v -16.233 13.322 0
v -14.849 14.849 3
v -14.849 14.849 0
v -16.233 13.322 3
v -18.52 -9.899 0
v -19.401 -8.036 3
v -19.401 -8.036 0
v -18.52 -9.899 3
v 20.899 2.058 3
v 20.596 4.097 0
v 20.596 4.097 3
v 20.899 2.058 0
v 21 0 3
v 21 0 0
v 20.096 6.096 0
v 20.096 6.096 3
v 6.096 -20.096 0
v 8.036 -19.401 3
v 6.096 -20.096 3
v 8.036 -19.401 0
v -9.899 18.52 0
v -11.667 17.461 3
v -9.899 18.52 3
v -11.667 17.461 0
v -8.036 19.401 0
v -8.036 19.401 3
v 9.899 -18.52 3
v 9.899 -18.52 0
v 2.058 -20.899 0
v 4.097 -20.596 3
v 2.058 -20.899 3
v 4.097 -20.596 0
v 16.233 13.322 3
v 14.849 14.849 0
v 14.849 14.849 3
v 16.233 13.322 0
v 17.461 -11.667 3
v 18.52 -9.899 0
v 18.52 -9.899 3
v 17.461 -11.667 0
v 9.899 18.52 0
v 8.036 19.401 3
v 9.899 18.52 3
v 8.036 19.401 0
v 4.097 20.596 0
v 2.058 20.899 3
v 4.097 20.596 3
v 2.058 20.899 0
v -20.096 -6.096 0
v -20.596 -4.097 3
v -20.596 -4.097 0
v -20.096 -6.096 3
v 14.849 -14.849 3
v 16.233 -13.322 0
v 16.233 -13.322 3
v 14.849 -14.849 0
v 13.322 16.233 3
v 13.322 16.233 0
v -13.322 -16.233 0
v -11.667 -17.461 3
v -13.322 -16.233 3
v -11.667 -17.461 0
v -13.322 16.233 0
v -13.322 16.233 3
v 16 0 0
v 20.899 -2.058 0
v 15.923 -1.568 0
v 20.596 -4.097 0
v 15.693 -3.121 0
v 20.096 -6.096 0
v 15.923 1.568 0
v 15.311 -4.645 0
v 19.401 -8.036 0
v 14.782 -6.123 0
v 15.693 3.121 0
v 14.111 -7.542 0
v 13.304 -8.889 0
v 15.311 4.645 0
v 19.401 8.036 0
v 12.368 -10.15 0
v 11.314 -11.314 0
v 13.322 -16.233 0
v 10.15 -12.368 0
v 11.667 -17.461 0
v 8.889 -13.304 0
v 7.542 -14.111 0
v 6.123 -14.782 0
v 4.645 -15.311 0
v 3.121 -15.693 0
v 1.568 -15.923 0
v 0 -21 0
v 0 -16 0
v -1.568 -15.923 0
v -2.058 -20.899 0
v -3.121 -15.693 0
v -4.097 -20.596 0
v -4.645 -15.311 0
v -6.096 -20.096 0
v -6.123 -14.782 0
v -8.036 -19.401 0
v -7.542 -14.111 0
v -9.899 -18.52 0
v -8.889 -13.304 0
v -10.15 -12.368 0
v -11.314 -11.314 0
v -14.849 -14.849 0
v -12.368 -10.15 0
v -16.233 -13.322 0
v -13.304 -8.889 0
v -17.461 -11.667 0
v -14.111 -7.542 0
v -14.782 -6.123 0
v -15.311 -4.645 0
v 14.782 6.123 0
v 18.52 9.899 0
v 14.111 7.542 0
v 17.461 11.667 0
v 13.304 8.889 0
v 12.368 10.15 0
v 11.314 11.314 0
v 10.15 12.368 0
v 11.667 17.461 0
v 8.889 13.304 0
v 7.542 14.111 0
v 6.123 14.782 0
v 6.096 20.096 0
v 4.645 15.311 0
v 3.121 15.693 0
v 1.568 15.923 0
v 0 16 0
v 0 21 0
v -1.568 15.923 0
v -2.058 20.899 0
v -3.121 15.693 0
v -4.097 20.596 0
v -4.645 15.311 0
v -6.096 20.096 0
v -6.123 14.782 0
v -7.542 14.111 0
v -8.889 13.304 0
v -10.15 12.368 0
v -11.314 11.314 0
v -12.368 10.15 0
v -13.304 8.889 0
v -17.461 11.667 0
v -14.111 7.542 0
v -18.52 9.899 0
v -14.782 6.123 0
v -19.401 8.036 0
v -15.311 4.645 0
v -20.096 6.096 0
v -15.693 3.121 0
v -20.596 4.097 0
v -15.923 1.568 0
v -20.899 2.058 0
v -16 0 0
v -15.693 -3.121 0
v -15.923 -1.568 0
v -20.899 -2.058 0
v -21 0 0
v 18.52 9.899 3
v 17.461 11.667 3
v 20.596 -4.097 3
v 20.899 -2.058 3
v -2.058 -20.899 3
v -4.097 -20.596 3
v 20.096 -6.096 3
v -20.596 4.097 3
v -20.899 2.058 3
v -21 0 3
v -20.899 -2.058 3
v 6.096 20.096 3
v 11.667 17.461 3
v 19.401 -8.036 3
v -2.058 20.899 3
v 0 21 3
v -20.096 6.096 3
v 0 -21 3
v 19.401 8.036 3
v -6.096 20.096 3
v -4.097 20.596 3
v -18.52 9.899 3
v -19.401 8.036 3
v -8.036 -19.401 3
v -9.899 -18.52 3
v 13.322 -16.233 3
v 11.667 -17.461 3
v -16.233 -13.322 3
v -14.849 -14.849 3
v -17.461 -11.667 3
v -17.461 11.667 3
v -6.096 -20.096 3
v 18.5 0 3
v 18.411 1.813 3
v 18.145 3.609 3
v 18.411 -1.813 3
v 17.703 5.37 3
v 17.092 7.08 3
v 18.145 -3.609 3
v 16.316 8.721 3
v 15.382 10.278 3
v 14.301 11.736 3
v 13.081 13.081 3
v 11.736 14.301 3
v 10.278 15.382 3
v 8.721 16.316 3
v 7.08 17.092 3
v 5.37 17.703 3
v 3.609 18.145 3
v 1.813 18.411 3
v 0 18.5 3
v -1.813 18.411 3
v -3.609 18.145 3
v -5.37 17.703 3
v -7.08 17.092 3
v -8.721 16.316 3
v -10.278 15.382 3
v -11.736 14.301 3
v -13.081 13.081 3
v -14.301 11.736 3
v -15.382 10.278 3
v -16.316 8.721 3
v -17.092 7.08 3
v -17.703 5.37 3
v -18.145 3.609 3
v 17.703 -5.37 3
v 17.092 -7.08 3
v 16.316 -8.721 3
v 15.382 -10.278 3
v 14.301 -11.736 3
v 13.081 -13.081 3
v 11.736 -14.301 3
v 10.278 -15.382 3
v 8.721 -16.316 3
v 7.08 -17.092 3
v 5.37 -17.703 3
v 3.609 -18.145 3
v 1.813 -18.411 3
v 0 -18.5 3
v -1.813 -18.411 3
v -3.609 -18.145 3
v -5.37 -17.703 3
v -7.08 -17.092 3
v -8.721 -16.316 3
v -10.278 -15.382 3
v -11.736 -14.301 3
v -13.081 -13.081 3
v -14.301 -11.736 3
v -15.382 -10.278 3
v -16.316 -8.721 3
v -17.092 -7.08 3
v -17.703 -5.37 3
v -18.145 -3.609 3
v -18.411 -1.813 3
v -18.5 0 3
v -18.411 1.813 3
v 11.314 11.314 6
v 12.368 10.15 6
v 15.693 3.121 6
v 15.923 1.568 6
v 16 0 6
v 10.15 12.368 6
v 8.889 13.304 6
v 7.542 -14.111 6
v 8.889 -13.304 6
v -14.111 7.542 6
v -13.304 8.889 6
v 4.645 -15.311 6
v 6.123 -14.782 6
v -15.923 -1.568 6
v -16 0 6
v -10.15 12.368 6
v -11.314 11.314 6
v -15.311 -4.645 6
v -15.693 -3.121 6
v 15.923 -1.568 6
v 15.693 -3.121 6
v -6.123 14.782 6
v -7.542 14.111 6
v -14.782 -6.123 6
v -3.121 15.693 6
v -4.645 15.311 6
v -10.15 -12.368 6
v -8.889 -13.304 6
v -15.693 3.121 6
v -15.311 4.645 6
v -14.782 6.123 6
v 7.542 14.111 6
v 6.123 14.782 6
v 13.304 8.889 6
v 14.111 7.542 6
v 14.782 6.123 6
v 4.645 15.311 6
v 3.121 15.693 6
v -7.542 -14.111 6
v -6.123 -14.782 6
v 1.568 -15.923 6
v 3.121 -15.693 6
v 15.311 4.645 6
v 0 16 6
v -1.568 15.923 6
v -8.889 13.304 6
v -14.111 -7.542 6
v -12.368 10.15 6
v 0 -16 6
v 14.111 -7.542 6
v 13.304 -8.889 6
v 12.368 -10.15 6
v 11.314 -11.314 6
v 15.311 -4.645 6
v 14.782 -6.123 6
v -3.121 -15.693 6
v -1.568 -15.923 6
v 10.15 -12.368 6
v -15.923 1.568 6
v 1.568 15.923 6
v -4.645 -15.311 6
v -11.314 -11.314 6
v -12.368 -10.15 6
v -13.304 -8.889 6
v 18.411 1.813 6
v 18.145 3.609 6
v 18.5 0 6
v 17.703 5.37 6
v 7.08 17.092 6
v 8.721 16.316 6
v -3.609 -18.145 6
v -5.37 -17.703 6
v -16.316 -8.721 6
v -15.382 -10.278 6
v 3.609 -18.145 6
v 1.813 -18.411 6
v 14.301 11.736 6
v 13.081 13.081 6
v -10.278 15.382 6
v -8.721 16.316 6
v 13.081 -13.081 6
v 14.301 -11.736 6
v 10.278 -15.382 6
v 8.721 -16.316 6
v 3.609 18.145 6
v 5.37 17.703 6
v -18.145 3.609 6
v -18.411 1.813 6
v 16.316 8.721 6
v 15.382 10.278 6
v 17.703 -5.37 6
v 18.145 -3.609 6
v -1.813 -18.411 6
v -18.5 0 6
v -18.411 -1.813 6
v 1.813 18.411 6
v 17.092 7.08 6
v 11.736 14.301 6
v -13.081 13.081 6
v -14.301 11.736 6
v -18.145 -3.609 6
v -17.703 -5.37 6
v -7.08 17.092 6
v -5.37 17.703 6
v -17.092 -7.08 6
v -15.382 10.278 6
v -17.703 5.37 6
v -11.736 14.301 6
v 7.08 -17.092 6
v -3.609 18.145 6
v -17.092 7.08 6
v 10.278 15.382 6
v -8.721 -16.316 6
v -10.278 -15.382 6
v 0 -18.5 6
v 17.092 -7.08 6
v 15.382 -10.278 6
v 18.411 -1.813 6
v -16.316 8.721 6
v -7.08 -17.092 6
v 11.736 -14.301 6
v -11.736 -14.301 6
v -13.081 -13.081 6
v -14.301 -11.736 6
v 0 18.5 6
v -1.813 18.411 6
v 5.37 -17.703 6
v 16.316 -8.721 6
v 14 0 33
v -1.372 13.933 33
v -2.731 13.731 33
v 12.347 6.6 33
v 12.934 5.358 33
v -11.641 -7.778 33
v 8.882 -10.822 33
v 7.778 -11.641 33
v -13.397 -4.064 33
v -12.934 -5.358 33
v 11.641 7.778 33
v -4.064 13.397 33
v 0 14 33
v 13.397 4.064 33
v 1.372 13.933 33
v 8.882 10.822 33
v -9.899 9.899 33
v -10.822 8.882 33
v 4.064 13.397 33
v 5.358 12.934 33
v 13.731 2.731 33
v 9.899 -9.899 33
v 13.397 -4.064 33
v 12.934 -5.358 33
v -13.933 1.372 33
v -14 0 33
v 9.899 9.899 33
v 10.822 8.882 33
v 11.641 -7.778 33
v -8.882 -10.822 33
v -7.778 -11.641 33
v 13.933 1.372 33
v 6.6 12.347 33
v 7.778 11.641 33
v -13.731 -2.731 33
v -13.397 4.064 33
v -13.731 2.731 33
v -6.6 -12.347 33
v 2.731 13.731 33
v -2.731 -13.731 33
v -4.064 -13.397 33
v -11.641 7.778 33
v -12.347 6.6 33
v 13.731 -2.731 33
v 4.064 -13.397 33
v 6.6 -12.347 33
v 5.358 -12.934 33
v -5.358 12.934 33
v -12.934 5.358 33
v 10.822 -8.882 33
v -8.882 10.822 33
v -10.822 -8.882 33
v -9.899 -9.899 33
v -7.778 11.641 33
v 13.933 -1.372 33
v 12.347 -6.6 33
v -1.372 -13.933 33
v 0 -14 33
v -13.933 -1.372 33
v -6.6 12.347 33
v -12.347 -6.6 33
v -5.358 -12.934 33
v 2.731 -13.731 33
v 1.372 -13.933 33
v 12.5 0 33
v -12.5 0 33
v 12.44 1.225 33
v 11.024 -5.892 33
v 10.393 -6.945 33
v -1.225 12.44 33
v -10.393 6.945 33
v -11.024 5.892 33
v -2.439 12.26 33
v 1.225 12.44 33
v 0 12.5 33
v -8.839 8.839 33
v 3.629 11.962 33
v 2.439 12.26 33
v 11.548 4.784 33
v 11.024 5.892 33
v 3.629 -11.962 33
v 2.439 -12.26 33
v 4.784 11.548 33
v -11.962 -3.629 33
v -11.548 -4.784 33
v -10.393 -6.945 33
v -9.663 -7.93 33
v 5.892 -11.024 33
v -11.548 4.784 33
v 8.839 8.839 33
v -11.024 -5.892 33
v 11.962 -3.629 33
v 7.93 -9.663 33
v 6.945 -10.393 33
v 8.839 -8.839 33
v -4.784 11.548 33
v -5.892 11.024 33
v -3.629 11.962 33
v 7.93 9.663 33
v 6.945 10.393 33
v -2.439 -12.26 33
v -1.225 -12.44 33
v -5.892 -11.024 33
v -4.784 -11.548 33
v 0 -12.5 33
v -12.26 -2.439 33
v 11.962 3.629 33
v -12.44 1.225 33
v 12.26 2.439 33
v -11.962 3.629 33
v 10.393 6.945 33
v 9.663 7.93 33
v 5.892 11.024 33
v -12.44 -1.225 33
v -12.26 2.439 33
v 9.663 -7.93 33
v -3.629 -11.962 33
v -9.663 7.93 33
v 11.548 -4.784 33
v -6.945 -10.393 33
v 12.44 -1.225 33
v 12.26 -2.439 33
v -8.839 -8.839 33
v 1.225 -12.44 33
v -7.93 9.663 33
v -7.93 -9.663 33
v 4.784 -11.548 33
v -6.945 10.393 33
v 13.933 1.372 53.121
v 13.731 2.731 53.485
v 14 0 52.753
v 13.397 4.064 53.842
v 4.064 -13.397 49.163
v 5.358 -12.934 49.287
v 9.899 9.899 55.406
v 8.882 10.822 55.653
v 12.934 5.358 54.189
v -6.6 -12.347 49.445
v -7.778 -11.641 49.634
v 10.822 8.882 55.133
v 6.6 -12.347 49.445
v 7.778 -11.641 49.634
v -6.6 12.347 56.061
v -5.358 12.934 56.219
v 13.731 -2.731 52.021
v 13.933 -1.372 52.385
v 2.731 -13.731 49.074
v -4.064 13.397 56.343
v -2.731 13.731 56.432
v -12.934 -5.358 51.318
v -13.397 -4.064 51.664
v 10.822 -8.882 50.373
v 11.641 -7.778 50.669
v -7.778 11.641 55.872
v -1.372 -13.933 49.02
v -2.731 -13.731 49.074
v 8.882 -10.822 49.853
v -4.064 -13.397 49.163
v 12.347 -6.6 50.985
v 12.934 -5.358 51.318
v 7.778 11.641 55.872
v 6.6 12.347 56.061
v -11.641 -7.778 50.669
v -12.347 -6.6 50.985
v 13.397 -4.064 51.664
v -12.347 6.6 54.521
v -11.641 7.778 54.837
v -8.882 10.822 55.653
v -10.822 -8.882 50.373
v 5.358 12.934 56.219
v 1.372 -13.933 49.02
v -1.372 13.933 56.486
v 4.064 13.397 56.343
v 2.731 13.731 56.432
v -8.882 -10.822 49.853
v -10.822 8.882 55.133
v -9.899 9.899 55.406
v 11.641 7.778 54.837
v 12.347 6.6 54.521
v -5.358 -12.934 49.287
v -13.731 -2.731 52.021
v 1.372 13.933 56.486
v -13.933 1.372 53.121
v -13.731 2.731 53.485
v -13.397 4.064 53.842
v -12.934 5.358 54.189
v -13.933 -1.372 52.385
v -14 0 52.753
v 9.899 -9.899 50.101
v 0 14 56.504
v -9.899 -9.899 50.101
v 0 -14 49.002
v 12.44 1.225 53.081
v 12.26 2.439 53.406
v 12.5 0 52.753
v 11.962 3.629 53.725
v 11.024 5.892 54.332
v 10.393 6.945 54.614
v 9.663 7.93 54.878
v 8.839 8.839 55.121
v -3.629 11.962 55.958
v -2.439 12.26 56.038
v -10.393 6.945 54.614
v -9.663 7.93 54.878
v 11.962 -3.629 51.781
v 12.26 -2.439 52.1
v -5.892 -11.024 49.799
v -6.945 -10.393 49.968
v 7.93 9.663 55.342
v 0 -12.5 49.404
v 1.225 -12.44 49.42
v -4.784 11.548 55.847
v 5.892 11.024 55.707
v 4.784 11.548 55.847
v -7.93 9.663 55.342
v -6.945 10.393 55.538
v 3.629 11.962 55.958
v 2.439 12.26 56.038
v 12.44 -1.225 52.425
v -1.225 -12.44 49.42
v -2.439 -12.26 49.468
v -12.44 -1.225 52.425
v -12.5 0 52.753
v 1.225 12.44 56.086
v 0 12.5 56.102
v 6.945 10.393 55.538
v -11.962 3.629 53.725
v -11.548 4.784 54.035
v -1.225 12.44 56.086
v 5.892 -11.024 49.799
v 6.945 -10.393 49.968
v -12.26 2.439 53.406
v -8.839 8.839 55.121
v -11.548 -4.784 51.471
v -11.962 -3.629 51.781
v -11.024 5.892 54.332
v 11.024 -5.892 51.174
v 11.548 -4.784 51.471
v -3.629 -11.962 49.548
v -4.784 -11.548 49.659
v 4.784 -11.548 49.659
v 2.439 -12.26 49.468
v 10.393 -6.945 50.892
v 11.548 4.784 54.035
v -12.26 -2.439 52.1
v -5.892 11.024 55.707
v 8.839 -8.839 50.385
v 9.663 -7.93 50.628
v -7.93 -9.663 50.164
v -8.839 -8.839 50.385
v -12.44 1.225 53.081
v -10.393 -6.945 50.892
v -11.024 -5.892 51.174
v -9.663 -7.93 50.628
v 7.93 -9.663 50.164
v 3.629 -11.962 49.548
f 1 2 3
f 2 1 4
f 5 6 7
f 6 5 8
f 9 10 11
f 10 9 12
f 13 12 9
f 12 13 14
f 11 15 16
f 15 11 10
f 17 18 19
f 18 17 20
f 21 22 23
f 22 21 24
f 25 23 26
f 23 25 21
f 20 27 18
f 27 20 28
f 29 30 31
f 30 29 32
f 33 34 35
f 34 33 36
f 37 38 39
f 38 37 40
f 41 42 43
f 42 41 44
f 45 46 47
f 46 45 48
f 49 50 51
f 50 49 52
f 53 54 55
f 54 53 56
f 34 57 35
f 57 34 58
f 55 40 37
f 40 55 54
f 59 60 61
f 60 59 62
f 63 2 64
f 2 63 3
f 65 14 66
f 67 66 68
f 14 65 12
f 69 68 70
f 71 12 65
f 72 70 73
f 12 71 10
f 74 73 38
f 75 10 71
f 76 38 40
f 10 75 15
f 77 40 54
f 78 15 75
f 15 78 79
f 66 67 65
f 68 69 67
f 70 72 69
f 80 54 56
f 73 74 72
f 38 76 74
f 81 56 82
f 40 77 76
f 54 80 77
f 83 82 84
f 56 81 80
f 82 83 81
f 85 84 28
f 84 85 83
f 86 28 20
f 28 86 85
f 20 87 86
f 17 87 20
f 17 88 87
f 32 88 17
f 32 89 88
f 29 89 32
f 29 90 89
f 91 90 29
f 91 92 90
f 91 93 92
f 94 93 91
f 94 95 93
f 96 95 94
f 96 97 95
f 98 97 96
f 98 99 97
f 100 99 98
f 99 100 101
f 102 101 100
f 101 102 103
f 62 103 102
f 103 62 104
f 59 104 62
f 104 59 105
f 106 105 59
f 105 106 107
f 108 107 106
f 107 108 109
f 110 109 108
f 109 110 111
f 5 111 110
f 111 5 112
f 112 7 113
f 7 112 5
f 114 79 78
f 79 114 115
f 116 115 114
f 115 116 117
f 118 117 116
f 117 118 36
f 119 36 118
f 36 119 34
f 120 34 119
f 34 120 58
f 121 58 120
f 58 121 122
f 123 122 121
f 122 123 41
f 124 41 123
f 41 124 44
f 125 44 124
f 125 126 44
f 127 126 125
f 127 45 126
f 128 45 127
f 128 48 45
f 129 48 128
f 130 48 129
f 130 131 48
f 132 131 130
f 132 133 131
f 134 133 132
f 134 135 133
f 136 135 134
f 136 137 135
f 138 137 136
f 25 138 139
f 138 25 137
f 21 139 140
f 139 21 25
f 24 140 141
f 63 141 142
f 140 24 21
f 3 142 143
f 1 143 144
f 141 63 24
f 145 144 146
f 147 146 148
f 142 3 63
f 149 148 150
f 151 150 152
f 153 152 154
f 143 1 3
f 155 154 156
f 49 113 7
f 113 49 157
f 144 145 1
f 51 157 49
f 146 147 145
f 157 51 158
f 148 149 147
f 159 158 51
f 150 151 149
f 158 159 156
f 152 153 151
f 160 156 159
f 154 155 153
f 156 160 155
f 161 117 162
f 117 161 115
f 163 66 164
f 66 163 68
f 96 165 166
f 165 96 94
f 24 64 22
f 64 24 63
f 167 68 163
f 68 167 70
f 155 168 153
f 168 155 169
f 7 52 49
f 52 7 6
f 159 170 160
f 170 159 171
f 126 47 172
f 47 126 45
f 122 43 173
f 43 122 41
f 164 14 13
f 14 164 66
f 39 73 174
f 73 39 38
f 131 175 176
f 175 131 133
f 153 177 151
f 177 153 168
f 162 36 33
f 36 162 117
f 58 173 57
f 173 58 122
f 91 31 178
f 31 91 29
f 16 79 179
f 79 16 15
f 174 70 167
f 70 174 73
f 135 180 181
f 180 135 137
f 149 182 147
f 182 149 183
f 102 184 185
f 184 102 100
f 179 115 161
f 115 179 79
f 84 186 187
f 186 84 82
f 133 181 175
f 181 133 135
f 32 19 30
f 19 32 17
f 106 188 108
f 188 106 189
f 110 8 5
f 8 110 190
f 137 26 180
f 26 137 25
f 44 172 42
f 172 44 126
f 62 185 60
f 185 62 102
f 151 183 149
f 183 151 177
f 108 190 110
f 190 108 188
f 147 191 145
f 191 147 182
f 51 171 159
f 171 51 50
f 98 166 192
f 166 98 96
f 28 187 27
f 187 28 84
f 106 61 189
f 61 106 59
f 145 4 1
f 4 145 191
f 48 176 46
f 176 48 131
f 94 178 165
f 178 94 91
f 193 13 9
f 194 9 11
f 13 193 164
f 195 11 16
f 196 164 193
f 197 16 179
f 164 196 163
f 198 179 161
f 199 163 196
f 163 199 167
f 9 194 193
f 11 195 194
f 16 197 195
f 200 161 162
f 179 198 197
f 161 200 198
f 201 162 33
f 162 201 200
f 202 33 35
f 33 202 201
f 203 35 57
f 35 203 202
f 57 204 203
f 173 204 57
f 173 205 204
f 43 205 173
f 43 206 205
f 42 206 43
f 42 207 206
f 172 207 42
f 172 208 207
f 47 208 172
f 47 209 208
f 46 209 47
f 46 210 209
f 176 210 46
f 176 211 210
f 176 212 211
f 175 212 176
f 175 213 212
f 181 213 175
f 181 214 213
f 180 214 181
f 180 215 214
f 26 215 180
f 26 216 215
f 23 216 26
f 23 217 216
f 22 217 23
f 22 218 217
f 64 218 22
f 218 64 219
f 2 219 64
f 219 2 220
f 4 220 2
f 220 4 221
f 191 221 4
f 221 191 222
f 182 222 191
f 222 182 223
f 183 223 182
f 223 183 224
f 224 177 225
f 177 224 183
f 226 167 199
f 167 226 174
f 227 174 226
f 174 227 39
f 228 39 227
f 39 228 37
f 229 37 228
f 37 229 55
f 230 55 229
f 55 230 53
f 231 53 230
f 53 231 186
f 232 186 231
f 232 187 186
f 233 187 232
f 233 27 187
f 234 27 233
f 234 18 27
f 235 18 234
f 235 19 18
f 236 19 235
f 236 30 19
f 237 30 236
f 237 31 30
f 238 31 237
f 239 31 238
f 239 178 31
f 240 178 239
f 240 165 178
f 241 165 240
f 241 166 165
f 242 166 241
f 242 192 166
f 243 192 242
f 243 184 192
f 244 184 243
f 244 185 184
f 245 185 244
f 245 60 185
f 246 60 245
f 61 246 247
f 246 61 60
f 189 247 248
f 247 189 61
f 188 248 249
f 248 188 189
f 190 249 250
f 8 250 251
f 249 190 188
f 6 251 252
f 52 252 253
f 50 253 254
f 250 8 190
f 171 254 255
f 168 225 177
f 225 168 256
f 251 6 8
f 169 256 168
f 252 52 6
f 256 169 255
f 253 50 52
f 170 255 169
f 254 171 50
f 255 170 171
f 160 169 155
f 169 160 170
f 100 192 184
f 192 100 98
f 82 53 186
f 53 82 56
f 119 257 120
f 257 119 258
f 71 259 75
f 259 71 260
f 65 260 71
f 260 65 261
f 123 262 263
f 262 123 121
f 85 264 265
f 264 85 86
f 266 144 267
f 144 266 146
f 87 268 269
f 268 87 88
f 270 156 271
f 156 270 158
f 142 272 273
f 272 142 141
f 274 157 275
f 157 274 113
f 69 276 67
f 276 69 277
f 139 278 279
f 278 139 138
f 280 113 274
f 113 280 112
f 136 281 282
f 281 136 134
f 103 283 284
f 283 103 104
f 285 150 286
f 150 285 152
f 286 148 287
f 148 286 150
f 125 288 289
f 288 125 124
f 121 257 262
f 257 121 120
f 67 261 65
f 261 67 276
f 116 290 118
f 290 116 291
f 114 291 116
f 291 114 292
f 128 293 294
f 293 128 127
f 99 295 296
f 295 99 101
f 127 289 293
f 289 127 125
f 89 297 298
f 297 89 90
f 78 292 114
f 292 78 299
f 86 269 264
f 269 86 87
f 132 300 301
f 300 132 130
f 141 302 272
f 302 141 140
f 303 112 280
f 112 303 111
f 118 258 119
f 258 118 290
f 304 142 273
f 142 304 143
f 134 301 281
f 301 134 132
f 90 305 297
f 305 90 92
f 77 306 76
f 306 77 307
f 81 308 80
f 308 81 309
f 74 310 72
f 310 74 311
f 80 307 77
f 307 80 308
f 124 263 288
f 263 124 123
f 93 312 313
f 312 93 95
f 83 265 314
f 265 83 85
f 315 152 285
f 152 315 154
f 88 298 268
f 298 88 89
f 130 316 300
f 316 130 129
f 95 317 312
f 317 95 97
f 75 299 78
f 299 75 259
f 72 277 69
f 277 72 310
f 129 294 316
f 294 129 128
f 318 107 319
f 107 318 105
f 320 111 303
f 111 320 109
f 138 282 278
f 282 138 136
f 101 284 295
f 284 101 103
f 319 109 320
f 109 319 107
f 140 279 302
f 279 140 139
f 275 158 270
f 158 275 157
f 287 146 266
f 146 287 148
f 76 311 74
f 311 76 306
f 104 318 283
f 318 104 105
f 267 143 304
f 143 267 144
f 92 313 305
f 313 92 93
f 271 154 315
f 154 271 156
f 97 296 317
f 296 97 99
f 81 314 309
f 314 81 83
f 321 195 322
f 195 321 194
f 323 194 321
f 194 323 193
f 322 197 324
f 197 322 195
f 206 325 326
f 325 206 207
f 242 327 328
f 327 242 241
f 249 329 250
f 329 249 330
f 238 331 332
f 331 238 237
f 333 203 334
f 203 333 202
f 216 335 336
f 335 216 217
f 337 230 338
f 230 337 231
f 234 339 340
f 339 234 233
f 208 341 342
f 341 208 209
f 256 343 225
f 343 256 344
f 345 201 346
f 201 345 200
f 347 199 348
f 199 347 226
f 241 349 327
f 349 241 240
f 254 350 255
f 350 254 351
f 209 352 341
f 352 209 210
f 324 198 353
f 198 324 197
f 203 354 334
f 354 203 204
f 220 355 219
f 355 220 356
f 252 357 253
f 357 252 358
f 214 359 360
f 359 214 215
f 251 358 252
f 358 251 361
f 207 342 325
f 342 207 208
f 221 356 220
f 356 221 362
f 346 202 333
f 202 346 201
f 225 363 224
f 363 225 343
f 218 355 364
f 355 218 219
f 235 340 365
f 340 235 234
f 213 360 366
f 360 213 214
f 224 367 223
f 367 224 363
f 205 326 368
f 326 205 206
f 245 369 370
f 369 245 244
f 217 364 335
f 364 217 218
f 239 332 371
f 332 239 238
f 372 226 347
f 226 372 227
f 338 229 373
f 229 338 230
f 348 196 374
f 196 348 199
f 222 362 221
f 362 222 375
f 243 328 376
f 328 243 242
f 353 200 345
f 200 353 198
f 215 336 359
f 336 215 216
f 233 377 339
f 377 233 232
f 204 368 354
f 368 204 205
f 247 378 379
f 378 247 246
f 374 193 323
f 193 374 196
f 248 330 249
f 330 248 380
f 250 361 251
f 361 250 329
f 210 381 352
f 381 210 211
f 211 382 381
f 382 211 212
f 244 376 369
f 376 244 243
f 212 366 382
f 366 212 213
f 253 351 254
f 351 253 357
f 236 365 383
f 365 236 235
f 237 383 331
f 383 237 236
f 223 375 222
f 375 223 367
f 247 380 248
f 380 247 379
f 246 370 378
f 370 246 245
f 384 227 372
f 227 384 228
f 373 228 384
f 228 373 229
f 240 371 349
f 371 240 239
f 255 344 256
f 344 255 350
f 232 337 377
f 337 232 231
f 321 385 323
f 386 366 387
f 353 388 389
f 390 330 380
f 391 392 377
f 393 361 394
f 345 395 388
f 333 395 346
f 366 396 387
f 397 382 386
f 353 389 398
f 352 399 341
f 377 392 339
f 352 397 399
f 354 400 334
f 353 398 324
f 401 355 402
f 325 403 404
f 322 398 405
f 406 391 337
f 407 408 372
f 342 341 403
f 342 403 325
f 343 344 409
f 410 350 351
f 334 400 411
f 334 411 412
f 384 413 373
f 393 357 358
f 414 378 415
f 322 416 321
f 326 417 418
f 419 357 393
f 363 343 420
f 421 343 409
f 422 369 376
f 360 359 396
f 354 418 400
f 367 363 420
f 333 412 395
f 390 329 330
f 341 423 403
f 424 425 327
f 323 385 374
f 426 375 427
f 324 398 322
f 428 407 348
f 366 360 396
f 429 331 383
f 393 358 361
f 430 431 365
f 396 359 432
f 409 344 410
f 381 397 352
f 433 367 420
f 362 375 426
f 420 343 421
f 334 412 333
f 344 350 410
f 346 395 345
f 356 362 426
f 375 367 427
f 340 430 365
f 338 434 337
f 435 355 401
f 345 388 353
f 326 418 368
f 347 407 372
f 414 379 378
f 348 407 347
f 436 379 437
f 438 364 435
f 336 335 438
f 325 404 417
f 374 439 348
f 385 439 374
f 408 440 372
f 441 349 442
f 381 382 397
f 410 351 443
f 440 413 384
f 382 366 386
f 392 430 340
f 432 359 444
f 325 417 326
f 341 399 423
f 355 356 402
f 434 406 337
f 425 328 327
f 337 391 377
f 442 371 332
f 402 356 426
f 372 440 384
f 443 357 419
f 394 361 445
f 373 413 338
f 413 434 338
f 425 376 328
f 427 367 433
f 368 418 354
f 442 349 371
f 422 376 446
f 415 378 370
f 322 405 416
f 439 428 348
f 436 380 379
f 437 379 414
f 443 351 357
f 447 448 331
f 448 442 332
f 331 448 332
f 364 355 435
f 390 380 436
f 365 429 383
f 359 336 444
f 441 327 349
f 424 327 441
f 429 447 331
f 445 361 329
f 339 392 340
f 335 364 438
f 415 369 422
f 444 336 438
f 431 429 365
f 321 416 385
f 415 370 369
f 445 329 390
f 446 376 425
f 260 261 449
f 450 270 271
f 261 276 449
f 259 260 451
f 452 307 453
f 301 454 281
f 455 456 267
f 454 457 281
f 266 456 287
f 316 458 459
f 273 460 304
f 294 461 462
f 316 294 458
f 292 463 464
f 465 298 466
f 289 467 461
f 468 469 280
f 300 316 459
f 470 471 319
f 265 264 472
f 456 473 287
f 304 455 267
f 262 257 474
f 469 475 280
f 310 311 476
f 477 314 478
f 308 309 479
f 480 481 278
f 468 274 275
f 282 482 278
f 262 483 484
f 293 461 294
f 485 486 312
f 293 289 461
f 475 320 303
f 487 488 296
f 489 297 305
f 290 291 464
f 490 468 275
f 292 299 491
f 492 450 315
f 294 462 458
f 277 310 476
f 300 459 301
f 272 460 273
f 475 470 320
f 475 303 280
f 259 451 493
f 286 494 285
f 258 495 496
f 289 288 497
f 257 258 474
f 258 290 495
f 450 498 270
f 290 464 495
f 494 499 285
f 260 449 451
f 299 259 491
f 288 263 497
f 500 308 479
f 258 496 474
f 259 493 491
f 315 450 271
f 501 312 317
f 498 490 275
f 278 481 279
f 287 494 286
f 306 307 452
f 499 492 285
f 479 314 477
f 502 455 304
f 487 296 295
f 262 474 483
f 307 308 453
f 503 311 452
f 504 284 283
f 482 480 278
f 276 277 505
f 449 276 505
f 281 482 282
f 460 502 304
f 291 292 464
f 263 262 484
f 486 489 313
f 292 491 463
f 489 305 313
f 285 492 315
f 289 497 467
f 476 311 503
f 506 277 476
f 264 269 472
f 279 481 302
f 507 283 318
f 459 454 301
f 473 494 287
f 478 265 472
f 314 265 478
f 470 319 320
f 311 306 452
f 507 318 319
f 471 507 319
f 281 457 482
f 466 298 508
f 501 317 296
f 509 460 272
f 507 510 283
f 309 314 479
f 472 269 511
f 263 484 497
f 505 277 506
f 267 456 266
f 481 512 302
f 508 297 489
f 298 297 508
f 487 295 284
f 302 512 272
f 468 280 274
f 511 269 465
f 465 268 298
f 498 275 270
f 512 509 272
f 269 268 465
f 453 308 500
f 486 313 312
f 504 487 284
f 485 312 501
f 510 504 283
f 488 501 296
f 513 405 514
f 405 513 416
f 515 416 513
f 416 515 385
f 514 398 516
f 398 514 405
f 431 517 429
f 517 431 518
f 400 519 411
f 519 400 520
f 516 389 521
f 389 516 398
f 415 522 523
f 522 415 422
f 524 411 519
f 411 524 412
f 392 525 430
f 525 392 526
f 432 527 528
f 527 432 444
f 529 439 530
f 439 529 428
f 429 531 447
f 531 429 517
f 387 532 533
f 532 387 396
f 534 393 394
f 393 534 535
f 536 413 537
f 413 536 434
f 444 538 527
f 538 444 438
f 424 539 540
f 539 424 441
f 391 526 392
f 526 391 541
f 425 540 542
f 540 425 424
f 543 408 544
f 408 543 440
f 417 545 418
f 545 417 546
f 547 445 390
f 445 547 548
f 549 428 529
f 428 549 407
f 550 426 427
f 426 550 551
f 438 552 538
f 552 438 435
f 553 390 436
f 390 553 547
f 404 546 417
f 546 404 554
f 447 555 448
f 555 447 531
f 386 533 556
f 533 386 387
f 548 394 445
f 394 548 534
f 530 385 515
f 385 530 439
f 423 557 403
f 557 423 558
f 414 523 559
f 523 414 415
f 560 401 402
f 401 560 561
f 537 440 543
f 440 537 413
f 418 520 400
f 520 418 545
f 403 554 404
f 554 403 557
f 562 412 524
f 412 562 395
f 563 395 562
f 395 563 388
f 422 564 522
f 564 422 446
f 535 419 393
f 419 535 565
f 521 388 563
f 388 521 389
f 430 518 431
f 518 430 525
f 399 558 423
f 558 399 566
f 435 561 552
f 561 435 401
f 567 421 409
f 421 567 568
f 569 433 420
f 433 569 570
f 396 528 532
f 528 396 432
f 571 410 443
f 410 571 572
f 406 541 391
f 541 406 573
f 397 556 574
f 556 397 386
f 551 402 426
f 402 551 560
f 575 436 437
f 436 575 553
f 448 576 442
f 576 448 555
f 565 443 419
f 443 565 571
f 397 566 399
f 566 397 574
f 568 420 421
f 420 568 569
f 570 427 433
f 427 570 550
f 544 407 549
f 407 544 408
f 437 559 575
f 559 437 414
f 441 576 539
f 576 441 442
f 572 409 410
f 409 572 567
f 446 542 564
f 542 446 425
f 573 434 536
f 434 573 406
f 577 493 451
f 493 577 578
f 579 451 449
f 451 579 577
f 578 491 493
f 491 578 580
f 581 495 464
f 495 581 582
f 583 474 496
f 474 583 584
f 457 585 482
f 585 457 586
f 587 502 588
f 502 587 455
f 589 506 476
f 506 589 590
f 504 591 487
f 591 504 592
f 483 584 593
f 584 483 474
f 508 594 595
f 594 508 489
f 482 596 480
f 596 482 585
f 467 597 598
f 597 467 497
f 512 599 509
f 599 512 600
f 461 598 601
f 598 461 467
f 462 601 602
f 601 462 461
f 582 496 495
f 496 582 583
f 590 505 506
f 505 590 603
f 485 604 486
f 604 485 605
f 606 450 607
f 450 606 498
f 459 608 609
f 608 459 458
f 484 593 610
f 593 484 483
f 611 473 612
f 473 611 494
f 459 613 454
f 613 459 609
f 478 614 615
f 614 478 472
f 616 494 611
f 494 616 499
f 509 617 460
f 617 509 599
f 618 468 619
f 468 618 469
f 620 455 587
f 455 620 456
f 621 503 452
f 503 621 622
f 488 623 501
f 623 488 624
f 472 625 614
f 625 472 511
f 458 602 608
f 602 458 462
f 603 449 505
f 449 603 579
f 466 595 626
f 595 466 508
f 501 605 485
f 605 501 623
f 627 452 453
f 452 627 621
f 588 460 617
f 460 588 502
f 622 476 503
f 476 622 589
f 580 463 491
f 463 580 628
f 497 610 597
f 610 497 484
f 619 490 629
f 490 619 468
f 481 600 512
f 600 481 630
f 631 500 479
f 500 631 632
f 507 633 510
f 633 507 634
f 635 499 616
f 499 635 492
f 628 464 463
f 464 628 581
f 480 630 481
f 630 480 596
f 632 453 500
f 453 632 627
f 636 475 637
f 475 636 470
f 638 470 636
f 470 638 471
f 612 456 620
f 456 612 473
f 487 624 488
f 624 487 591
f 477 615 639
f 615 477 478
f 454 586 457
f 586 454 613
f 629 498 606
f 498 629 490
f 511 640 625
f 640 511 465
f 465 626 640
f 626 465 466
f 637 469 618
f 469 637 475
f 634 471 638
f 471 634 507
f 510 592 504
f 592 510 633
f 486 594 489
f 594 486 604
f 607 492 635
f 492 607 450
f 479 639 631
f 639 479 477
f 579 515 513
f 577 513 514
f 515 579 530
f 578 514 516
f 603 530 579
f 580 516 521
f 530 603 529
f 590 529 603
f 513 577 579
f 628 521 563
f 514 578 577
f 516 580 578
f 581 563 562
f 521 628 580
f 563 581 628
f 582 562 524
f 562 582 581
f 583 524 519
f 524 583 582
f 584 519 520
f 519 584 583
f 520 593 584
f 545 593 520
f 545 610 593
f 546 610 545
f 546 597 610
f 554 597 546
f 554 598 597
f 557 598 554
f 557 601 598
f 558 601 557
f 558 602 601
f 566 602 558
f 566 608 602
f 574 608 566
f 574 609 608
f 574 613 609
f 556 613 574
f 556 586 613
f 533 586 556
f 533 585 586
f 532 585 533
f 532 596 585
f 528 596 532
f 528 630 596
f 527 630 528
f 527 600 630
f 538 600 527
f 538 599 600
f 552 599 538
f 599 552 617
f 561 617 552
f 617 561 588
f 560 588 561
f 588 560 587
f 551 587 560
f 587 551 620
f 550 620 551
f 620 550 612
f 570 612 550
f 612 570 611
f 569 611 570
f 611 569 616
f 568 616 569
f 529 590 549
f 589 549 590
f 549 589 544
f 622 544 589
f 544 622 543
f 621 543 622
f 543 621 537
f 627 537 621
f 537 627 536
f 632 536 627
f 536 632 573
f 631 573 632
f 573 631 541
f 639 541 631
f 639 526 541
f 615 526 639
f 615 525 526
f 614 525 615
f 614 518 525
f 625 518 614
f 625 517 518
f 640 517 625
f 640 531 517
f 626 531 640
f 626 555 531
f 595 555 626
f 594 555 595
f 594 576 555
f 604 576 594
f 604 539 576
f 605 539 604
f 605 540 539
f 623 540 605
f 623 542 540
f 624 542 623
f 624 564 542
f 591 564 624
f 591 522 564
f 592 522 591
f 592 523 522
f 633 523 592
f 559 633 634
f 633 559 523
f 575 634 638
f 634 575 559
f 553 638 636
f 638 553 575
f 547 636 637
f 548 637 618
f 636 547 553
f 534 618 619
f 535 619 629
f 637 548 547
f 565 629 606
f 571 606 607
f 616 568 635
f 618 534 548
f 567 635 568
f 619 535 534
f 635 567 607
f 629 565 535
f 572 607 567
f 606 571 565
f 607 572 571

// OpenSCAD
// the first one of these I tried to print, the flange on
// top was printed as a series of concentric circles which didn't
// adhere well to the rest and cracked off.  So I've made the
// flange slightly thicker and printed it with 100mm bottom
// thickness so that the whole thing is filled with plywood-
// like zigzag layers.  Hopefully that will be more robust!
// The spout part is all still concentric walls but it's under
// no load so should be okay.

$fn=64;

od1 = 42;
id1 = 32;
h1 = 3;

od2 = 37;
id2 = 32;
h2 = 3;

od3 = 28;
id3 = 25;
h3 = 27;

h4 = 27;

intersection() {
 
    union() {   
        difference() {
            cylinder(d=od1, h=h1);
            cylinder(d=id1, h=h1);
        }
        translate([0,0,h1]) difference() {
            cylinder(d=od2, h=h2);
            cylinder(d1=id1, d2=id2, h=h2);
        }
        translate([0,0,h1+h2]) difference() {
            cylinder(d1=od2,d2=od3,h=h3);
            cylinder(d1=id2,d2=id3,h=h3);
        }
        translate([0,0,h1+h2+h3]) difference() {
            cylinder(d=od3,h=h4);
            cylinder(d=id3,h=h4);
        }
    }
    translate([0,0,h1+h2+h3+h4]) rotate([15,0,0]) translate([0,0,-107]) cube([200,200,200],center=true);
}
